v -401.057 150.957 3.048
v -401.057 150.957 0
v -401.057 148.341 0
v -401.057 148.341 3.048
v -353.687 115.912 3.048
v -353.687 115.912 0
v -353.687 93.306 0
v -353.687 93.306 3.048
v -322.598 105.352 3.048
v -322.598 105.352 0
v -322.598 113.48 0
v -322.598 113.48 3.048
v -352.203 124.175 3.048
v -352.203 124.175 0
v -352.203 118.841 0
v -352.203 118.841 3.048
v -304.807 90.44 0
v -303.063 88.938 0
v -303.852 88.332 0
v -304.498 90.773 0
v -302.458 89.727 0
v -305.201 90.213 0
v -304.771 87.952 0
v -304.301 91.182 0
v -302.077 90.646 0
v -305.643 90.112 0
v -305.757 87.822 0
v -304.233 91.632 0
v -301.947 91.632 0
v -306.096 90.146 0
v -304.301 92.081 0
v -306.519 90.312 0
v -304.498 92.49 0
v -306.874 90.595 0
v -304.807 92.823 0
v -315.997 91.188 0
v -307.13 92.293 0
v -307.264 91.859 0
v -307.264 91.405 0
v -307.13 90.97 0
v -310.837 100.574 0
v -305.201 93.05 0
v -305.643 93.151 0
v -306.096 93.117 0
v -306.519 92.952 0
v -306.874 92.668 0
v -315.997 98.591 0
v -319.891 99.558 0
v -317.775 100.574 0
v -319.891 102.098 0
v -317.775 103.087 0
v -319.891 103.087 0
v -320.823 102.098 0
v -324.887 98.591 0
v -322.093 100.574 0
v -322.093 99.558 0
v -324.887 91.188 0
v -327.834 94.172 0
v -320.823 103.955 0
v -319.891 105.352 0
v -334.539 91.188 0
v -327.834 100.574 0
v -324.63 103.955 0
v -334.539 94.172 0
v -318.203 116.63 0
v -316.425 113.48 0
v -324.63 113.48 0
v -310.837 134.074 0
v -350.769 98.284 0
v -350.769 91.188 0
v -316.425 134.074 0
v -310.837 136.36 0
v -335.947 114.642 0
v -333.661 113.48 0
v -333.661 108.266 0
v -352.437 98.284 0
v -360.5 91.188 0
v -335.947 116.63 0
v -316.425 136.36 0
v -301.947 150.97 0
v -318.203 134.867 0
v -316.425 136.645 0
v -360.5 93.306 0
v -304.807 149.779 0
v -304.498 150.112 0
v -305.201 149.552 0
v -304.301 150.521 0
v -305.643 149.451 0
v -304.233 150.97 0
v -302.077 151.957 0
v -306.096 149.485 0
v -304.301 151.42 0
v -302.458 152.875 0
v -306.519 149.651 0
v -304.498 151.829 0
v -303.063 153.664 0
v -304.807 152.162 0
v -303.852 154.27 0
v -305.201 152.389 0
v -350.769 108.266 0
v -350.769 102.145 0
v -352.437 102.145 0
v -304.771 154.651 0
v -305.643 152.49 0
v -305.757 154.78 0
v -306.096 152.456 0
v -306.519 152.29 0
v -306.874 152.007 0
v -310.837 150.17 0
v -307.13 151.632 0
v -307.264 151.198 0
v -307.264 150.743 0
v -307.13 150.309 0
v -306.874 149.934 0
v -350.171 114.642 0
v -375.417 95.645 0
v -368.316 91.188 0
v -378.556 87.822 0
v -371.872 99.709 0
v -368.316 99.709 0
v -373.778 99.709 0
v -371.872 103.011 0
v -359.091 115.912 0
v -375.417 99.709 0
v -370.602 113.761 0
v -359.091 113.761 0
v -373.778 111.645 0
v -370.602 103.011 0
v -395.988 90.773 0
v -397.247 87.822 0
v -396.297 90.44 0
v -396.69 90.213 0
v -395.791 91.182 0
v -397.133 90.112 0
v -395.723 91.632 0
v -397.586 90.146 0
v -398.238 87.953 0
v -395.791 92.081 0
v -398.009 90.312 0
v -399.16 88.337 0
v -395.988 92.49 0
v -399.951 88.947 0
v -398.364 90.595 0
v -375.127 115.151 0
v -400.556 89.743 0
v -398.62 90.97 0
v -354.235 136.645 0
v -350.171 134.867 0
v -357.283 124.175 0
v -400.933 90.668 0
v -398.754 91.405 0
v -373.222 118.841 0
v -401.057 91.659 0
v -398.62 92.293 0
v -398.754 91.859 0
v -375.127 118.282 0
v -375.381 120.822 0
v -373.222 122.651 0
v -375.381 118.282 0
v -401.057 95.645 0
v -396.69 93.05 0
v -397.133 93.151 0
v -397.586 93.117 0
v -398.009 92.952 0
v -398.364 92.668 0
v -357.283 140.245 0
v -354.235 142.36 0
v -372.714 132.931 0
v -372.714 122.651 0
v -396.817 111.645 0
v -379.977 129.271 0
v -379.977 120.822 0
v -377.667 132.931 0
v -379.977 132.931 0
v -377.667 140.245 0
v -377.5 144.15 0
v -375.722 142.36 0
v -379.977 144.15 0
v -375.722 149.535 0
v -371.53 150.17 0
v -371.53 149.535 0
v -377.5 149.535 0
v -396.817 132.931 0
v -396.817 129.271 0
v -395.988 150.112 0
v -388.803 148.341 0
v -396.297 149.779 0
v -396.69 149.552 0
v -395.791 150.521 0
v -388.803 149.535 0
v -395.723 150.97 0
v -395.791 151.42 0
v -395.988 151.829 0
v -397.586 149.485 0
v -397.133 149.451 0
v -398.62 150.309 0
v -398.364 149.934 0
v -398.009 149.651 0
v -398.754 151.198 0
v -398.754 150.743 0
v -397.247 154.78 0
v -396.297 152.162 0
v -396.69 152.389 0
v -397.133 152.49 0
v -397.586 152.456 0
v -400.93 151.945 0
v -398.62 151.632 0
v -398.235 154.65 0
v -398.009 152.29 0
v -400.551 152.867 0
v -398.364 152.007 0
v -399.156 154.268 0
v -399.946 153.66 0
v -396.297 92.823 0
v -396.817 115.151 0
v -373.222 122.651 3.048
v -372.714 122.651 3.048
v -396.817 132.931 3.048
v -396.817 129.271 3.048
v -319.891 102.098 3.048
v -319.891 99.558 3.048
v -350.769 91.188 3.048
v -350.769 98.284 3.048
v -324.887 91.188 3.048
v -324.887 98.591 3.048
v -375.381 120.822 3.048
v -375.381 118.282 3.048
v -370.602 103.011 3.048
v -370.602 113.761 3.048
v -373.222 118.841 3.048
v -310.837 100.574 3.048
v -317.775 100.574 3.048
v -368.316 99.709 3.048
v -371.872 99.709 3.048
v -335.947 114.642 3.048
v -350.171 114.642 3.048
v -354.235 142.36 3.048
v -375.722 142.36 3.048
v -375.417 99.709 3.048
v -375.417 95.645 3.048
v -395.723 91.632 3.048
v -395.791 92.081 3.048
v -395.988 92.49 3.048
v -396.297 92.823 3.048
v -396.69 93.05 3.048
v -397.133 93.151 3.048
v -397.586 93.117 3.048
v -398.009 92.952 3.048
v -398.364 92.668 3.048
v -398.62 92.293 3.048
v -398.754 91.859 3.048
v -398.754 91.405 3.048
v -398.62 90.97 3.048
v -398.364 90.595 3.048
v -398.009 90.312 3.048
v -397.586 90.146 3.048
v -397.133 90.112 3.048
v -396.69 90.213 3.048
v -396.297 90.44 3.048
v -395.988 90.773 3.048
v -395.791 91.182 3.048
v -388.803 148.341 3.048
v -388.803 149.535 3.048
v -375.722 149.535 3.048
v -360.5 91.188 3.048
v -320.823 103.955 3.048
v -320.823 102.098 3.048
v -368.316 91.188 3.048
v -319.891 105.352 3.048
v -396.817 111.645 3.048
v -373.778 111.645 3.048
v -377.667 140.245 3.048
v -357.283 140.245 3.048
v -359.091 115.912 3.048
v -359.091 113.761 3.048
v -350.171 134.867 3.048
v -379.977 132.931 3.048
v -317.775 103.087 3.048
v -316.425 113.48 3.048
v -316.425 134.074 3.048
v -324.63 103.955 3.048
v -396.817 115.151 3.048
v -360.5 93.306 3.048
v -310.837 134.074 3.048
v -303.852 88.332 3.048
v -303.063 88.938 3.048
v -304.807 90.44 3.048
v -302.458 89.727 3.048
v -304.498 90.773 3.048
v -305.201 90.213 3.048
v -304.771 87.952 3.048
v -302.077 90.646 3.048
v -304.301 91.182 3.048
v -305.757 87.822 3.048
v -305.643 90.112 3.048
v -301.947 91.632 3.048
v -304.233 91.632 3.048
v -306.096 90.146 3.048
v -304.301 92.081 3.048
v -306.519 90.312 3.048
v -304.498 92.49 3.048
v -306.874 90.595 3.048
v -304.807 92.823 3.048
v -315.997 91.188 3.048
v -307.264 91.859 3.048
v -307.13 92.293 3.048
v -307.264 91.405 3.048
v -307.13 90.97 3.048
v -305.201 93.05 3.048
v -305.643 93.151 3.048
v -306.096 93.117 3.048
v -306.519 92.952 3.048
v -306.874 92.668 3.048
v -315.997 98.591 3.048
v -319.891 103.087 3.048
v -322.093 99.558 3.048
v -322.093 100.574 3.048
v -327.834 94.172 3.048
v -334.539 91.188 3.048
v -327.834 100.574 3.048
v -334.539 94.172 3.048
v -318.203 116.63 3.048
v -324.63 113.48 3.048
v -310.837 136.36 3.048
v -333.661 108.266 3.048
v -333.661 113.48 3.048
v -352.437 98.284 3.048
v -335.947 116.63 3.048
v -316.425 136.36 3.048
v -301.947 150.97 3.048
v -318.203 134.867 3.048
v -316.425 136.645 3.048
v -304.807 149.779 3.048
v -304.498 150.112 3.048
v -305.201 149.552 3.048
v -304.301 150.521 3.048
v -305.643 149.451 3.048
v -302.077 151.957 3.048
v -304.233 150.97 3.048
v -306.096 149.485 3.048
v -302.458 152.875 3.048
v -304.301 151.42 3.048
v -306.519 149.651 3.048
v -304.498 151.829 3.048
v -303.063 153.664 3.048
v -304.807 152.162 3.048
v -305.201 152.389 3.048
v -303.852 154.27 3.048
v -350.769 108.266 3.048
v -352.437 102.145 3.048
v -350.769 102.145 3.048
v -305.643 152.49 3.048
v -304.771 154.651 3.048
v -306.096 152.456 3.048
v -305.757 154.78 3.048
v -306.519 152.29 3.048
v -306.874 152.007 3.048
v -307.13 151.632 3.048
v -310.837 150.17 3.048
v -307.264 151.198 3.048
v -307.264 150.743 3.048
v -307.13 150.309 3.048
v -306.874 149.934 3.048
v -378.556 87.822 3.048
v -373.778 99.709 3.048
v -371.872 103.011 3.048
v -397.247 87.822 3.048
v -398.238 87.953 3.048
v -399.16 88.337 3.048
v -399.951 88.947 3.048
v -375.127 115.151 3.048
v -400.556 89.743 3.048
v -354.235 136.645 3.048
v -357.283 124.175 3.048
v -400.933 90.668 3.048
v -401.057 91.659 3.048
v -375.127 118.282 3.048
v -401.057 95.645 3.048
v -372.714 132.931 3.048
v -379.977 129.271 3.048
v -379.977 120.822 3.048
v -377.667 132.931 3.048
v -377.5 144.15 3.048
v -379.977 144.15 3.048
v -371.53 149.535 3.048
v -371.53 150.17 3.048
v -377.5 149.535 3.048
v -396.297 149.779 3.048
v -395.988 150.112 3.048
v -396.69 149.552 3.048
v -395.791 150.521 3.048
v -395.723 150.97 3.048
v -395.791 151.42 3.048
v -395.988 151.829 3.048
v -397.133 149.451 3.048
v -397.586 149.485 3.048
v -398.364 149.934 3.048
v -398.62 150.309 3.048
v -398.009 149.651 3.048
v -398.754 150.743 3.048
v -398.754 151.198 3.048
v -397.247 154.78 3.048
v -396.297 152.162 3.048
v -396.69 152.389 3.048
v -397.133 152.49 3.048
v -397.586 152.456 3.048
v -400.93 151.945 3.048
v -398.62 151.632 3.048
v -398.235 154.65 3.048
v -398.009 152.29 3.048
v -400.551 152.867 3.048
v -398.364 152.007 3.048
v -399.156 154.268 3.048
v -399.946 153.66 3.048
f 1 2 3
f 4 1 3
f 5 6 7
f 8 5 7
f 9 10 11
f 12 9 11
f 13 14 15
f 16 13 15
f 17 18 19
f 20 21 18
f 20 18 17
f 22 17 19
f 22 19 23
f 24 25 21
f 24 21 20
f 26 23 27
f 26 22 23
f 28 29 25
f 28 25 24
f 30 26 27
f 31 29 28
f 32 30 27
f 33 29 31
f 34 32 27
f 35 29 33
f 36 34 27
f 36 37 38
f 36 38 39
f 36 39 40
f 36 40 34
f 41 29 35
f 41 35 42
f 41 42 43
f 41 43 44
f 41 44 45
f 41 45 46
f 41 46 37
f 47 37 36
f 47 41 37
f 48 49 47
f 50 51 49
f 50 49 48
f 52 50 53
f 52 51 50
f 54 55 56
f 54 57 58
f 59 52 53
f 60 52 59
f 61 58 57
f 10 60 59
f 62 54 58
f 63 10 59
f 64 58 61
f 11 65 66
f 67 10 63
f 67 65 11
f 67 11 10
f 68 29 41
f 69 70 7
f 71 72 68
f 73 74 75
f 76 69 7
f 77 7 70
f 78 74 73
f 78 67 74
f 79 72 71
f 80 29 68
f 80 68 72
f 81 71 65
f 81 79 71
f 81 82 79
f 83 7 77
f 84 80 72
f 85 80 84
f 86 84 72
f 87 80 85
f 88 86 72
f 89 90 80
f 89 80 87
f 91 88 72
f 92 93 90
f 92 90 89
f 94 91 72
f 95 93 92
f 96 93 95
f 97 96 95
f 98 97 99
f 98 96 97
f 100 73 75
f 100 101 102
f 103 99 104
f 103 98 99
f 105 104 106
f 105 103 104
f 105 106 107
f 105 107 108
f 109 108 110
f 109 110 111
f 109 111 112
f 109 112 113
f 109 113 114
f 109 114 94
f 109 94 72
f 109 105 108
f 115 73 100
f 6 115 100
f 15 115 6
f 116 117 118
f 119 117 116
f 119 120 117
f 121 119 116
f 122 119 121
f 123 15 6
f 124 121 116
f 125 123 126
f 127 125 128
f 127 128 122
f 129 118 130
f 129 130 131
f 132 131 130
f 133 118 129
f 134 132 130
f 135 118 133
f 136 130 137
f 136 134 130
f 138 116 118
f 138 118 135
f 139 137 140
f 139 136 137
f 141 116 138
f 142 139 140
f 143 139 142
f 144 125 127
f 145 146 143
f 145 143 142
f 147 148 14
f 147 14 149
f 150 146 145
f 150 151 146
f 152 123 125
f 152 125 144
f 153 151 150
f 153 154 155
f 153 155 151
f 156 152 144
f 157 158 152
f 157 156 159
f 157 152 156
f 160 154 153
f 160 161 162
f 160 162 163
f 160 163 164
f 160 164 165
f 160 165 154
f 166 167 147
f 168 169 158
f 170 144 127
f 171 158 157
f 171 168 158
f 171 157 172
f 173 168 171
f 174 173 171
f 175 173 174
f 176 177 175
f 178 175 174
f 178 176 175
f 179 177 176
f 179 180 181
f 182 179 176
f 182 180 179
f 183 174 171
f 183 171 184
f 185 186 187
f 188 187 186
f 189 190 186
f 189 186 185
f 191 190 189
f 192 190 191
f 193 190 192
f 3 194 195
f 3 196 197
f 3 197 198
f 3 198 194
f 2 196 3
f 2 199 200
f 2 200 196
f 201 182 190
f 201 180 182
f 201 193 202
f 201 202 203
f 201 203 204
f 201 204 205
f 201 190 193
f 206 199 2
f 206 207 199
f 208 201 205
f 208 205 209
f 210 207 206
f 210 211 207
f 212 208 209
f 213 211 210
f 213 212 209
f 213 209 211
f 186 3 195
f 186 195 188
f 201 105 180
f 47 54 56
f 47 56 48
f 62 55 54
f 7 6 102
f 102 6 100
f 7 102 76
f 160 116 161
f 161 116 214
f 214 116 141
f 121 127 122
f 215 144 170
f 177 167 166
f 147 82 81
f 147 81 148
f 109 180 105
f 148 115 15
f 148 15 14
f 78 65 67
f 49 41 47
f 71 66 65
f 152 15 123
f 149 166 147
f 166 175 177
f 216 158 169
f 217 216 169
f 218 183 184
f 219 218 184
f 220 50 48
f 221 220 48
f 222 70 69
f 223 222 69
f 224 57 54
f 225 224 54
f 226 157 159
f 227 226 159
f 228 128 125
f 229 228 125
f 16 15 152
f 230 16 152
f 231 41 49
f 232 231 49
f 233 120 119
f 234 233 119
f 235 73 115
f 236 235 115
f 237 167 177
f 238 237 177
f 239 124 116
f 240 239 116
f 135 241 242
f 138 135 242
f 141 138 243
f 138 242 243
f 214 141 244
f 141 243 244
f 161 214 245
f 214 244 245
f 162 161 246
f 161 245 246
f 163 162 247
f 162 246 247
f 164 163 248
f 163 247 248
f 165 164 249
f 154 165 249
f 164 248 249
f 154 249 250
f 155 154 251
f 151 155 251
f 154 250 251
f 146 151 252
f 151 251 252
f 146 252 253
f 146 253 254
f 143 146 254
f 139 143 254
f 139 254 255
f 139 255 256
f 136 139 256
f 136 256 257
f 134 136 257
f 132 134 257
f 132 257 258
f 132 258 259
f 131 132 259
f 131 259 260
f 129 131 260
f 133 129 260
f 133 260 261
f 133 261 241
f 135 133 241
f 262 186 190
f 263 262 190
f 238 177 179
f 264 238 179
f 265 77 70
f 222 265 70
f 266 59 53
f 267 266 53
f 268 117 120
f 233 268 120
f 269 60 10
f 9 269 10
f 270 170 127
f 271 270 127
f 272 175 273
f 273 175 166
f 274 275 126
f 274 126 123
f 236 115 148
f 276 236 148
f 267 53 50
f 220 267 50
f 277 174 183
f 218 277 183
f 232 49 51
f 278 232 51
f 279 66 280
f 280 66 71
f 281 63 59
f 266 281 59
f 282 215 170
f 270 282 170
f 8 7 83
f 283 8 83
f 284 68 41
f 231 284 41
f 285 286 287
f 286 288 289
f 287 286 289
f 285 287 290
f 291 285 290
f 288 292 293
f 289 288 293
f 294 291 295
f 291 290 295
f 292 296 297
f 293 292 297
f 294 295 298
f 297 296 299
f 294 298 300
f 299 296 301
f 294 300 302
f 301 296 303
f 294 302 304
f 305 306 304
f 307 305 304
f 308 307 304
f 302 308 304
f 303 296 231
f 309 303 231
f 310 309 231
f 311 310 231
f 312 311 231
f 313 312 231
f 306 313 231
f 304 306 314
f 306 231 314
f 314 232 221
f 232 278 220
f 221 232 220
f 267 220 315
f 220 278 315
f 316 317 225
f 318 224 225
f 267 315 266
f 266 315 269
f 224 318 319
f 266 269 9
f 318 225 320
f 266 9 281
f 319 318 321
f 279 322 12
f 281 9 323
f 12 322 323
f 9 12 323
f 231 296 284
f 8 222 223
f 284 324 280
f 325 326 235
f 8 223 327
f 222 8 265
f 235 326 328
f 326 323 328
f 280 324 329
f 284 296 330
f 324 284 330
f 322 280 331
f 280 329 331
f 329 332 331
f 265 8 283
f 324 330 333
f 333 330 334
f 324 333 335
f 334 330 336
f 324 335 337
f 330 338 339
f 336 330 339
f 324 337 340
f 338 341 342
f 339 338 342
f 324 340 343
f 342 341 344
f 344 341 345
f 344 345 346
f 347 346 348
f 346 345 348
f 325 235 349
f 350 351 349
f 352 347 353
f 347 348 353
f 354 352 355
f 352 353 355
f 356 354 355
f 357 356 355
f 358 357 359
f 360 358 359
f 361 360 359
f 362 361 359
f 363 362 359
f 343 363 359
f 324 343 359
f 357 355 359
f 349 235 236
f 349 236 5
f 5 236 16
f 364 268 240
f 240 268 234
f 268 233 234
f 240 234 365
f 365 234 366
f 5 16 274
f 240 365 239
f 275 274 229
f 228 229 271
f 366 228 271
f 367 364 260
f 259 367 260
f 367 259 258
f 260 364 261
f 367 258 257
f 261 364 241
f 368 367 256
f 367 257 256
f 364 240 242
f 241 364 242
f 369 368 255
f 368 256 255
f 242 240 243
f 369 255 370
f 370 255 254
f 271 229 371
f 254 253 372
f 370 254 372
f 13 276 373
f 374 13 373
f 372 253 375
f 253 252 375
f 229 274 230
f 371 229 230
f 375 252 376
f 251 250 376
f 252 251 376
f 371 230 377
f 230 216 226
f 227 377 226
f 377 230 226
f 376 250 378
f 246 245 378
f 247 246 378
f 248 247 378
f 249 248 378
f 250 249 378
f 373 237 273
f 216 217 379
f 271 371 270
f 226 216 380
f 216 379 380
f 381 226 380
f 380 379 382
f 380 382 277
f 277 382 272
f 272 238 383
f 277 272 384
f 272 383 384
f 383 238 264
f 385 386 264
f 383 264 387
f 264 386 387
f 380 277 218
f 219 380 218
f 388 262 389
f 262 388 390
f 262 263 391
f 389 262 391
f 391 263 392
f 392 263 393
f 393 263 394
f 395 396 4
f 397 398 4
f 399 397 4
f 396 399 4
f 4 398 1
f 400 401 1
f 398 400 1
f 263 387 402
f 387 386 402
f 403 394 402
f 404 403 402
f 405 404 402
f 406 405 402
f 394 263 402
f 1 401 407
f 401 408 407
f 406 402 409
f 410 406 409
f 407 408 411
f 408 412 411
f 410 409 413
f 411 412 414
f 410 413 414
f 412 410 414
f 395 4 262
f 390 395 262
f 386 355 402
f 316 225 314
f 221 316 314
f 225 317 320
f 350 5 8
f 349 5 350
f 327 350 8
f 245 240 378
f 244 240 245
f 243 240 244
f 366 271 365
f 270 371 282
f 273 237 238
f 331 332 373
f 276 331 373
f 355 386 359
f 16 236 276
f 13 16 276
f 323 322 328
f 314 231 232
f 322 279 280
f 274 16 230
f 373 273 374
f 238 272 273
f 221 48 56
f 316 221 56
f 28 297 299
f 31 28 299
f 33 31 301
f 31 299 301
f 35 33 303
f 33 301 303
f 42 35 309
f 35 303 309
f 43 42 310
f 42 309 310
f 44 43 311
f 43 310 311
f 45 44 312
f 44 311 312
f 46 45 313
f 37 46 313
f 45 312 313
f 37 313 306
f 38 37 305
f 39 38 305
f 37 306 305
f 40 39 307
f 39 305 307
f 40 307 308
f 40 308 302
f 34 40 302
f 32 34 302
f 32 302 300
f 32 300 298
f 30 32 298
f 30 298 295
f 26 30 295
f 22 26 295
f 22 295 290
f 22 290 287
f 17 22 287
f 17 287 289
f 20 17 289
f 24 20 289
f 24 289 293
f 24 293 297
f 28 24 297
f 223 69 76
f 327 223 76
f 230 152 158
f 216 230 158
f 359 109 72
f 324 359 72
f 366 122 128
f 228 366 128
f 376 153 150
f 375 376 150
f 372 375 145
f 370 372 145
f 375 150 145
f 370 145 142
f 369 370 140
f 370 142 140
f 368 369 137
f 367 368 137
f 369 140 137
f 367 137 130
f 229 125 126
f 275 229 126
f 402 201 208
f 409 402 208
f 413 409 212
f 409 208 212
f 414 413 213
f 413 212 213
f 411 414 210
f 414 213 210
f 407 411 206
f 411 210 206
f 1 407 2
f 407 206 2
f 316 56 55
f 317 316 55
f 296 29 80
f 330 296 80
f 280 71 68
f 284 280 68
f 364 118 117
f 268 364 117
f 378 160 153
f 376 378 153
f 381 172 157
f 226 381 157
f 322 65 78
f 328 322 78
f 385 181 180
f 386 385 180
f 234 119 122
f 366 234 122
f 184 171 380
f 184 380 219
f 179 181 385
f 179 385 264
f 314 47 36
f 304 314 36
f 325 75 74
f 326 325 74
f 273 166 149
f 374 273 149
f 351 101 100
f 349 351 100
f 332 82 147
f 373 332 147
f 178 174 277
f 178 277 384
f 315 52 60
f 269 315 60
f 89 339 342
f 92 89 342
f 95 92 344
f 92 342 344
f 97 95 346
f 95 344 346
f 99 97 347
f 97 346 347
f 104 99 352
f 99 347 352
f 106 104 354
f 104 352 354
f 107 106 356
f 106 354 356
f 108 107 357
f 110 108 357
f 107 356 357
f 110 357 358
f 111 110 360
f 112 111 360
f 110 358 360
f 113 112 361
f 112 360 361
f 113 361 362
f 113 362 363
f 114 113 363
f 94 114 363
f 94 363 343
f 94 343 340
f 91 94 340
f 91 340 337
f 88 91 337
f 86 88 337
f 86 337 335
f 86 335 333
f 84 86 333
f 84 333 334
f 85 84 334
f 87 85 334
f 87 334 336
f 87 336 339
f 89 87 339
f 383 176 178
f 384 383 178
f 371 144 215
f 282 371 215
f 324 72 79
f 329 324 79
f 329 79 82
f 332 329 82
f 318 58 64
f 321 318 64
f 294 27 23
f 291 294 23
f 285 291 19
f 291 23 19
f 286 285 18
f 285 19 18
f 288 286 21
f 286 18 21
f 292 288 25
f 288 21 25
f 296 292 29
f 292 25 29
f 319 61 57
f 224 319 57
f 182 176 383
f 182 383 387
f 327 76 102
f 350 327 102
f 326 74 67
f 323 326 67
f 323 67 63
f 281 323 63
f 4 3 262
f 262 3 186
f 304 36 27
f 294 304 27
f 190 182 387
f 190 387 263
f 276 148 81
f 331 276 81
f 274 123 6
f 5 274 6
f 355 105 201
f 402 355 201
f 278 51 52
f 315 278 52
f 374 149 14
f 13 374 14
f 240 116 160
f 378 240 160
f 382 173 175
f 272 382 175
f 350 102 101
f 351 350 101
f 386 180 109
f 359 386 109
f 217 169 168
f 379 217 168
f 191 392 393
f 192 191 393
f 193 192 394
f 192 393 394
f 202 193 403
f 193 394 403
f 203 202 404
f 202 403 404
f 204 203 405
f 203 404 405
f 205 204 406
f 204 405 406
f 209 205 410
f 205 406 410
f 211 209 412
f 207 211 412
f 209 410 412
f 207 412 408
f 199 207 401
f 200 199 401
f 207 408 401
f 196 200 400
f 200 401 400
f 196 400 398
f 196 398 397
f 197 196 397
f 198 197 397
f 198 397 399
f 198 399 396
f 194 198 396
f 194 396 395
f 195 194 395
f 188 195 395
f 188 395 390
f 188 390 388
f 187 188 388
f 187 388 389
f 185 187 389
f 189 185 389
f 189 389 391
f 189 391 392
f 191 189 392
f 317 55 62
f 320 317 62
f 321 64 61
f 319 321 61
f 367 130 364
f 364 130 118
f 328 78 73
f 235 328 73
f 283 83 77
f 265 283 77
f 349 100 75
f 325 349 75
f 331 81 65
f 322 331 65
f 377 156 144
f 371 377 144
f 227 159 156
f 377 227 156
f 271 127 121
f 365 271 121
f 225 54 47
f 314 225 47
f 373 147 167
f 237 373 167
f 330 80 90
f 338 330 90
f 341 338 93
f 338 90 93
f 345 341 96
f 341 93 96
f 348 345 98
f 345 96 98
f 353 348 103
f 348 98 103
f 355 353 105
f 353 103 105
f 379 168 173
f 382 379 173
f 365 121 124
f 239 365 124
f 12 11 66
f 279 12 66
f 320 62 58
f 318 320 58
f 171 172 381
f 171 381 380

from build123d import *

# Parameters (mm, degrees)
BOSS_EXTRUDE1_OUTLINE_R = 1.3462
BOSS_EXTRUDE1_DEPTH     = 3.048
SKETCH14_W              = 2.2754
SKETCH14_H              = 2.1513
CUT_EXTRUDE2_DEPTH      = 430.898988368
SKETCH15_W              = 16.8402
SKETCH15_H              = 14.1197
SKETCH15_H_2            = 15.4101
CUT_EXTRUDE3_DEPTH      = 430.898988368
SKETCH16_R              = 1.524
CUT_EXTRUDE4_DEPTH      = 430.898988368
SKETCH17_W              = 13.7159
SKETCH17_H              = 5.7149
SKETCH17_W_2            = 4.1917
SKETCH17_H_2            = 7.175
CUT_EXTRUDE5_DEPTH      = 430.898988368
SKETCH18_W              = 1.778
SKETCH18_H              = 5.3847
BOSS_EXTRUDE9_DEPTH     = 3.048


# Read off the part's stored shape, not the designer's step: Boss-Extrude1
with BuildPart() as part:
    # Boss-Extrude1 outline → Boss-Extrude1 (new body)
    with BuildSketch(Plane.XY):
        with BuildLine():
            ThreePointArc((-397.247125, 154.7804), (-399.946077222, 153.659592612), (-401.0571, 150.956597849))
            Line((-401.0571, 150.956597849), (-401.0571, 148.341))
            Line((-401.0571, 148.341), (-388.8032, 148.341))
            Line((-388.8032, 148.341), (-388.8032, 149.5347))
            Line((-388.8032, 149.5347), (-375.7222, 149.5347))
            Line((-375.7222, 149.5347), (-375.7222, 144.15))
            Line((-375.7222, 144.15), (-380.1672, 144.15))
            Line((-380.1672, 144.15), (-380.1672, 132.9309))
            Line((-380.1672, 132.9309), (-396.8172, 132.9309))
            Line((-396.8172, 132.9309), (-396.8172, 129.2706))
            Line((-396.8172, 129.2706), (-380.1672, 129.2706))
            Line((-380.1672, 129.2706), (-380.1672, 120.8224))
            Line((-380.1672, 120.8224), (-375.3812, 120.8224))
            Line((-375.3812, 120.8224), (-375.3812, 118.2824))
            Line((-375.3812, 118.2824), (-375.1272, 118.2824))
            Line((-375.1272, 118.2824), (-375.1272, 115.1509))
            Line((-375.1272, 115.1509), (-396.8172, 115.1509))
            Line((-396.8172, 115.1509), (-396.8172, 111.6447))
            Line((-396.8172, 111.6447), (-373.7775, 111.6447))
            Line((-373.7775, 111.6447), (-373.7775, 99.7089))
            Line((-373.7775, 99.7089), (-375.4172, 99.7089))
            Line((-375.4172, 99.7089), (-375.4172, 95.6449))
            Line((-375.4172, 95.6449), (-401.0571, 95.6449))
            Line((-401.0571, 95.6449), (-401.0571, 91.659304166))
            ThreePointArc((-401.0571, 91.659304166), (-399.951018769, 88.947400452), (-397.2472, 87.8217))
            Line((-397.2472, 87.8217), (-378.5565, 87.8217))
            Line((-378.5565, 87.8217), (-368.3165, 91.1883))
            Line((-368.3165, 91.1883), (-368.3165, 99.7089))
            Line((-368.3165, 99.7089), (-371.8725, 99.7089))
            Line((-371.8725, 99.7089), (-371.8725, 103.0109))
            Line((-371.8725, 103.0109), (-370.6025, 103.0109))
            Line((-370.6025, 103.0109), (-370.6025, 113.7612))
            Line((-370.6025, 113.7612), (-356.8152, 113.7612))
            Line((-356.8152, 113.7612), (-356.8152, 115.9125))
            Line((-356.8152, 115.9125), (-353.6872, 115.9125))
            Line((-353.6872, 115.9125), (-353.6872, 93.3059))
            Line((-353.6872, 93.3059), (-360.5003, 93.3059))
            Line((-360.5003, 93.3059), (-360.5003, 91.1883))
            Line((-360.5003, 91.1883), (-350.7686, 91.1883))
            Line((-350.7686, 91.1883), (-350.7686, 98.2843))
            Line((-350.7686, 98.2843), (-352.4372, 98.2843))
            Line((-352.4372, 98.2843), (-352.4372, 102.1451))
            Line((-352.4372, 102.1451), (-350.7686, 102.1451))
            Line((-350.7686, 102.1451), (-350.7686, 108.2665))
            Line((-350.7686, 108.2665), (-333.6613, 108.2665))
            Line((-333.6613, 108.2665), (-333.6613, 113.4801))
            Line((-333.6613, 113.4801), (-324.6295, 113.4801))
            Line((-324.6295, 113.4801), (-324.6295, 103.9551))
            Line((-324.6295, 103.9551), (-320.8233, 103.9551))
            Line((-320.8233, 103.9551), (-320.8233, 102.0978))
            Line((-320.8233, 102.0978), (-319.8913, 102.0978))
            Line((-319.8913, 102.0978), (-319.8913, 99.5578))
            Line((-319.8913, 99.5578), (-322.0933, 99.5578))
            Line((-322.0933, 99.5578), (-322.0933, 100.5738))
            Line((-322.0933, 100.5738), (-327.8337, 100.5738))
            Line((-327.8337, 100.5738), (-327.8337, 94.1717))
            Line((-327.8337, 94.1717), (-334.5393, 94.1717))
            Line((-334.5393, 94.1717), (-334.5393, 91.1883))
            Line((-334.5393, 91.1883), (-324.8873, 91.1883))
            Line((-324.8873, 91.1883), (-324.8873, 98.5911))
            Line((-324.8873, 98.5911), (-315.9973, 98.5911))
            Line((-315.9973, 98.5911), (-315.9973, 91.1883))
            Line((-315.9973, 91.1883), (-305.7573, 87.8217))
            ThreePointArc((-305.7573, 87.8217), (-303.063223164, 88.937623164), (-301.9473, 91.6317))
            Line((-301.9473, 91.6317), (-301.9473, 150.9704))
            ThreePointArc((-301.9473, 150.9704), (-303.063223164, 153.664476836), (-305.7573, 154.7804))
            Line((-305.7573, 154.7804), (-397.247125, 154.7804))
        make_face()
        with Locations((-397.2472, 91.6317)):
            Circle(BOSS_EXTRUDE1_OUTLINE_R, mode=Mode.SUBTRACT)
        with Locations((-305.7573, 91.6317)):
            Circle(BOSS_EXTRUDE1_OUTLINE_R, mode=Mode.SUBTRACT)
        Polygon((-322.5975, 105.3521), (-322.5975, 113.4801), (-316.4253, 113.4801), (-316.4253, 134.0739), (-310.8373, 134.0739), (-310.8373, 100.5738), (-317.7753, 100.5738), (-317.7753, 103.0869), (-319.8913, 103.0869), (-319.8913, 105.3521), align=None, mode=Mode.SUBTRACT)
        Polygon((-372.7142, 122.6512), (-372.7142, 132.9309), (-377.6672, 132.9309), (-377.6672, 140.2451), (-357.2832, 140.2451), (-357.2832, 124.1751), (-352.2032, 124.1751), (-352.2032, 118.8412), (-373.2222, 118.8412), (-373.2222, 122.6512), align=None, mode=Mode.SUBTRACT)
        with Locations((-397.247125, 150.9704)):
            Circle(BOSS_EXTRUDE1_OUTLINE_R, mode=Mode.SUBTRACT)
        Polygon((-335.9473, 116.6297), (-335.9473, 114.6425), (-350.1712, 114.6425), (-350.1712, 134.8668), (-318.2033, 134.8668), (-318.2033, 116.6297), align=None, mode=Mode.SUBTRACT)
        Polygon((-310.8374, 136.3599), (-316.4253, 136.3599), (-316.4253, 136.6448), (-340.5193, 136.6448), (-340.5193, 142.3597), (-371.5305, 142.3597), (-371.5305, 150.1697), (-310.8373, 150.1697), align=None, mode=Mode.SUBTRACT)
        with Locations((-305.7573, 150.9704)):
            Circle(BOSS_EXTRUDE1_OUTLINE_R, mode=Mode.SUBTRACT)
    extrude(amount=BOSS_EXTRUDE1_DEPTH)

    # Sketch14 → Cut-Extrude2 (cut, through all)
    with BuildSketch(Plane(origin=(0, 0, 0), x_dir=(-1, 0, 0), z_dir=(0, 0, -1))):
        with Locations((357.9529, 114.83685)):
            Rectangle(SKETCH14_W, SKETCH14_H)
    extrude(amount=-CUT_EXTRUDE2_DEPTH, mode=Mode.SUBTRACT)

    # Sketch15 → Cut-Extrude3 (cut, through all)
    with BuildSketch(Plane(origin=(0, 0, 0), x_dir=(-1, 0, 0), z_dir=(0, 0, -1))):
        with Locations((388.3971, 122.21075)):
            Rectangle(SKETCH15_W, SKETCH15_H)
        with Locations((388.3971, 140.63595)):
            Rectangle(SKETCH15_W, SKETCH15_H_2)
    extrude(amount=-CUT_EXTRUDE3_DEPTH, mode=Mode.SUBTRACT)

    # Sketch16 → Cut-Extrude4 (cut, through all)
    with BuildSketch(Plane.XY.offset(3.048)):
        with Locations((-397.247125, 150.9704)):
            Circle(SKETCH16_R)
        with Locations((-305.7573, 150.9704)):
            Circle(SKETCH16_R)
        with Locations((-305.7573, 91.6317)):
            Circle(SKETCH16_R)
        with Locations((-397.2472, 91.6317)):
            Circle(SKETCH16_R)
    extrude(amount=-CUT_EXTRUDE4_DEPTH, mode=Mode.SUBTRACT)

    # Sketch17 → Cut-Extrude5 (cut, through all)
    with BuildSketch(Plane(origin=(0, 0, 0), x_dir=(-1, 0, 0), z_dir=(0, 0, -1))):
        with Locations((347.37725, 139.50225)):
            Rectangle(SKETCH17_W, SKETCH17_H)
        with Locations((373.62635, 145.9472)):
            Rectangle(SKETCH17_W_2, SKETCH17_H_2)
    extrude(amount=-CUT_EXTRUDE5_DEPTH, mode=Mode.SUBTRACT)

    # Sketch18 → Boss-Extrude9 (add)
    with BuildSketch(Plane(origin=(0, 0, 0), x_dir=(-1, 0, 0), z_dir=(0, 0, -1))):
        with Locations((376.6112, 146.84235)):
            Rectangle(SKETCH18_W, SKETCH18_H)
    extrude(amount=-BOSS_EXTRUDE9_DEPTH)


solid = part.part
